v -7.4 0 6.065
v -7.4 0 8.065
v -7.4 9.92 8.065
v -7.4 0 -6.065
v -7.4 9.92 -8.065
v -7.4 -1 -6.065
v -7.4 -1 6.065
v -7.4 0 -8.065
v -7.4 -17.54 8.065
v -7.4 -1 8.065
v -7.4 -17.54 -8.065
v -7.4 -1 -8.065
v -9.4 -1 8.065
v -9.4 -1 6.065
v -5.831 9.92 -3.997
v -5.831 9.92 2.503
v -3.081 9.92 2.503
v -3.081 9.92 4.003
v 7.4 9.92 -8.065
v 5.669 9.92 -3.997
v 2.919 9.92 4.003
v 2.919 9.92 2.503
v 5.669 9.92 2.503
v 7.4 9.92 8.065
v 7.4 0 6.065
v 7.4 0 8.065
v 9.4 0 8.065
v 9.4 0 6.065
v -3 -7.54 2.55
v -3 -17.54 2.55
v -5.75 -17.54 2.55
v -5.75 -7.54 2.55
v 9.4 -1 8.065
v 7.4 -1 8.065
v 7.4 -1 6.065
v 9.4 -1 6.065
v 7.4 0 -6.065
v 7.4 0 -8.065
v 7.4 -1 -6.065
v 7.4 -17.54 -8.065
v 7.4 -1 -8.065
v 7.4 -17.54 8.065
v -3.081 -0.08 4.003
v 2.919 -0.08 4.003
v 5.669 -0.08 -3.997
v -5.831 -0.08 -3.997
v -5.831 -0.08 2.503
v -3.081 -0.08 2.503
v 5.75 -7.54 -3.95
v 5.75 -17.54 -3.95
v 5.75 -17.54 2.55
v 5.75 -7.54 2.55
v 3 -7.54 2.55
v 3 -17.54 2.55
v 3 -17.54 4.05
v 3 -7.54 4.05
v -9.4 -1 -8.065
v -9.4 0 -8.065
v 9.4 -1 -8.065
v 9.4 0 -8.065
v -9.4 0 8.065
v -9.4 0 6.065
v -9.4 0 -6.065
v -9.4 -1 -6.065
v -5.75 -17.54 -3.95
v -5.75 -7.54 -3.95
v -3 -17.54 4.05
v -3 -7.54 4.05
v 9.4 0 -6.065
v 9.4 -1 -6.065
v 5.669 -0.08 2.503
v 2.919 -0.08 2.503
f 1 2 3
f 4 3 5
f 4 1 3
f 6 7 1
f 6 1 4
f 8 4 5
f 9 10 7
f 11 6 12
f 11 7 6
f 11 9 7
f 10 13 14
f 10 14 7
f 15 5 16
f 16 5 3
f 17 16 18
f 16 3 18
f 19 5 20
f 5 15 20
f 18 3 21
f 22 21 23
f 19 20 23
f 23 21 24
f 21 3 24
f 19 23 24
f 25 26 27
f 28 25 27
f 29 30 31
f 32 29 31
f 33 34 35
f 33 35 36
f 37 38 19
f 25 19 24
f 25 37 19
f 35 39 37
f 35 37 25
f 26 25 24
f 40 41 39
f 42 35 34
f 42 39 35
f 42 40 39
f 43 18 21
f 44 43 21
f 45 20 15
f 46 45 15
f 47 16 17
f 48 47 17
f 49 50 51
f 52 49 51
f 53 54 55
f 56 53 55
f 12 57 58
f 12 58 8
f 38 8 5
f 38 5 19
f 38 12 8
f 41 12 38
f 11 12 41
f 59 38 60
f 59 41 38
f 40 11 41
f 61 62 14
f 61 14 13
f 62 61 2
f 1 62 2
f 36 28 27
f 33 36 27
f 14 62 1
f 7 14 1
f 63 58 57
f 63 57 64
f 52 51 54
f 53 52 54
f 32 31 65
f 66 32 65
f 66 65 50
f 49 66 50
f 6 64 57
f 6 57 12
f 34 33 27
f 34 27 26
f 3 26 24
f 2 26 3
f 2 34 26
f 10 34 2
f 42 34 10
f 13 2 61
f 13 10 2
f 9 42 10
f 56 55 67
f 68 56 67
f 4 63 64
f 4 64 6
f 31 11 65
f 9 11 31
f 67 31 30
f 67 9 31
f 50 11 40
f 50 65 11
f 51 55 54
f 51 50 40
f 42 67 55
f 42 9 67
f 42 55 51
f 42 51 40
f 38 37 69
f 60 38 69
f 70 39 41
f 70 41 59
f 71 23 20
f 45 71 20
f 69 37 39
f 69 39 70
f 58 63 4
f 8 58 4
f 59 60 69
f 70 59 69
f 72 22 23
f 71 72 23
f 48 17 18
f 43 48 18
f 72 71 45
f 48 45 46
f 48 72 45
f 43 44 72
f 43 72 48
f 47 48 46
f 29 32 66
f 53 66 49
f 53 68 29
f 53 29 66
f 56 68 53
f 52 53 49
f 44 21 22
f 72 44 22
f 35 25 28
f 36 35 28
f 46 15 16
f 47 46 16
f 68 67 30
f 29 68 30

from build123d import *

# Parameters (mm, degrees)
F1_DEPTH      = 17.54
F1_DEPTH_BACK = 9.92
F0_W          = 2
F0_H          = 2
F2_DEPTH      = 1
F4_DEPTH      = 10
F6_DEPTH      = 10


with BuildPart() as f1:
    # F0 (on Front) → F1 (new body, two sides)
    with BuildSketch(Plane.XZ) as f1_sk:
        Polygon((7.4, 8.065), (-7.4, 8.065), (-7.4, 6.065), (-7.4, -6.065), (-7.4, -8.065), (7.4, -8.065), (7.4, -6.065), (7.4, 6.065), align=None)
    extrude(amount=F1_DEPTH)
    extrude(f1_sk.sketch, amount=-F1_DEPTH_BACK)

    # F0 (on Front) → F2 (join)
    with BuildSketch(Plane.XZ):
        with Locations((-8.4, 7.065)):
            Rectangle(F0_W, F0_H)
        with Locations((-8.4, -7.065)):
            Rectangle(F0_W, F0_H)
        with Locations((8.4, -7.065)):
            Rectangle(F0_W, F0_H)
        with Locations((8.4, 7.065)):
            Rectangle(F0_W, F0_H)
    extrude(amount=F2_DEPTH)

    # F3 (on face) → F4 (cut)
    with BuildSketch(Plane.XZ.offset(17.54)):
        Polygon((-5.75, -3.950203), (0, -3.950203), (5.75, -3.950203), (5.75, 2.549797), (3, 2.549797), (3, 4.049797), (0, 4.049797), (-3, 4.049797), (-3, 2.549797), (-5.75, 2.549797), align=None)
    extrude(amount=-F4_DEPTH, mode=Mode.SUBTRACT)

    # F5 (on face) → F6 (cut)
    with BuildSketch(Plane(origin=(0, 9.92, 0), x_dir=(-1, 0, 0), z_dir=(0, 1, 0))):
        Polygon((-5.668929, -3.996807), (0.081071, -3.996807), (5.831071, -3.996807), (5.831071, 2.503193), (3.081071, 2.503193), (3.081071, 4.003193), (0.081071, 4.003193), (-2.918929, 4.003193), (-2.918929, 2.503193), (-5.668929, 2.503193), align=None)
    extrude(amount=-F6_DEPTH, mode=Mode.SUBTRACT)


solid = f1.part
